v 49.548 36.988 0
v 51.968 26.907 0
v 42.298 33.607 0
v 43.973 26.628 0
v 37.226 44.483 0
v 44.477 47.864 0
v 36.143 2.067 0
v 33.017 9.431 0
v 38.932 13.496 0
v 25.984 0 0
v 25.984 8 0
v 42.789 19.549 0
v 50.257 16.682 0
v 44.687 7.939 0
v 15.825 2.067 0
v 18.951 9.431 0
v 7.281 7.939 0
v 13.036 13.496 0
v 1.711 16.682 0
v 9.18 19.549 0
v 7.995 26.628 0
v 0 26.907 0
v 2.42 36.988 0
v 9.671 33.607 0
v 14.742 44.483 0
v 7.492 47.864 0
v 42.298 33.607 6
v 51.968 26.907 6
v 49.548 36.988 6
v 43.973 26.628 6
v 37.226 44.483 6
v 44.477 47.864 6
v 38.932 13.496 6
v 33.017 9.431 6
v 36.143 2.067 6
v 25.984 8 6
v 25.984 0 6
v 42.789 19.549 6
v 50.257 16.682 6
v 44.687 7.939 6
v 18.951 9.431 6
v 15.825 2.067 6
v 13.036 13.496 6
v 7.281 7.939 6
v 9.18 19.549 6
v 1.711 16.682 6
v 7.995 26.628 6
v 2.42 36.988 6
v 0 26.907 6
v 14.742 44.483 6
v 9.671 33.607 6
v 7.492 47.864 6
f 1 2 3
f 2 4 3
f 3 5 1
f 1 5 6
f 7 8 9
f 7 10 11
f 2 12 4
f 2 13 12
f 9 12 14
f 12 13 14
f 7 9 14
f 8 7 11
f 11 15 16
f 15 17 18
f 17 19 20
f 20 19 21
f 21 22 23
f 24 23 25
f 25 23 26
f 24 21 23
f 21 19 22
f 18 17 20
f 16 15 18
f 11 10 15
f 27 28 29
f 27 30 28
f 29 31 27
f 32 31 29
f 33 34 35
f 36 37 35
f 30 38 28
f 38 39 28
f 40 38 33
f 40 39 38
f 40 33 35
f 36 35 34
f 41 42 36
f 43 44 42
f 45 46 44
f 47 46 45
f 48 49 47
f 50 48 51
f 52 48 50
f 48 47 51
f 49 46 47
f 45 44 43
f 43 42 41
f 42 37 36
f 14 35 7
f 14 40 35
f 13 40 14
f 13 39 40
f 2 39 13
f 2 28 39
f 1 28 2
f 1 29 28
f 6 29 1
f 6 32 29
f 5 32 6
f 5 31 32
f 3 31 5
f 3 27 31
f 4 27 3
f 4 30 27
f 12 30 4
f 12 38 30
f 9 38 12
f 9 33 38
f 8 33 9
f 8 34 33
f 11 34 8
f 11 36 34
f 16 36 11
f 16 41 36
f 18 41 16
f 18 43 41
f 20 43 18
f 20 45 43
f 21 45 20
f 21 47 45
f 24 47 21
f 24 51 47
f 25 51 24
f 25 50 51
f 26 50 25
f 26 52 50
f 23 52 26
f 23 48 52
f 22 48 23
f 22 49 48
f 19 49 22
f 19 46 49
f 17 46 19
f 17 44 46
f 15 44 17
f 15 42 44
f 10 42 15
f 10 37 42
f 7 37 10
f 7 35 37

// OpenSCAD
$fn = 32;

// ----------------------------------------------------------------------
// Clip blank: omega clip, 6 mm thick
// ----------------------------------------------------------------------

// --- parameters (mm) ---
profile_height = 6;       // extrusion height
profile_points = 26;      // points of the closed outline

profile = [[2.42, 36.988], [0, 26.907], [1.711, 16.682], [7.281, 7.939], [15.825, 2.067], [25.984, 0], [36.143, 2.067], [44.687, 7.939], [50.257, 16.682], [51.968, 26.907], [49.548, 36.988], [44.477, 47.864], [37.226, 44.483], [42.298, 33.607], [43.973, 26.628], [42.789, 19.549], [38.932, 13.496], [33.017, 9.431], [25.984, 8], [18.951, 9.431], [13.036, 13.496], [9.18, 19.549], [7.995, 26.628], [9.671, 33.607], [14.742, 44.483], [7.492, 47.864]];  // single closed polygon, 26 points, counter clockwise

// --- the one profile operation ---
linear_extrude(height = profile_height) polygon(points = profile);
